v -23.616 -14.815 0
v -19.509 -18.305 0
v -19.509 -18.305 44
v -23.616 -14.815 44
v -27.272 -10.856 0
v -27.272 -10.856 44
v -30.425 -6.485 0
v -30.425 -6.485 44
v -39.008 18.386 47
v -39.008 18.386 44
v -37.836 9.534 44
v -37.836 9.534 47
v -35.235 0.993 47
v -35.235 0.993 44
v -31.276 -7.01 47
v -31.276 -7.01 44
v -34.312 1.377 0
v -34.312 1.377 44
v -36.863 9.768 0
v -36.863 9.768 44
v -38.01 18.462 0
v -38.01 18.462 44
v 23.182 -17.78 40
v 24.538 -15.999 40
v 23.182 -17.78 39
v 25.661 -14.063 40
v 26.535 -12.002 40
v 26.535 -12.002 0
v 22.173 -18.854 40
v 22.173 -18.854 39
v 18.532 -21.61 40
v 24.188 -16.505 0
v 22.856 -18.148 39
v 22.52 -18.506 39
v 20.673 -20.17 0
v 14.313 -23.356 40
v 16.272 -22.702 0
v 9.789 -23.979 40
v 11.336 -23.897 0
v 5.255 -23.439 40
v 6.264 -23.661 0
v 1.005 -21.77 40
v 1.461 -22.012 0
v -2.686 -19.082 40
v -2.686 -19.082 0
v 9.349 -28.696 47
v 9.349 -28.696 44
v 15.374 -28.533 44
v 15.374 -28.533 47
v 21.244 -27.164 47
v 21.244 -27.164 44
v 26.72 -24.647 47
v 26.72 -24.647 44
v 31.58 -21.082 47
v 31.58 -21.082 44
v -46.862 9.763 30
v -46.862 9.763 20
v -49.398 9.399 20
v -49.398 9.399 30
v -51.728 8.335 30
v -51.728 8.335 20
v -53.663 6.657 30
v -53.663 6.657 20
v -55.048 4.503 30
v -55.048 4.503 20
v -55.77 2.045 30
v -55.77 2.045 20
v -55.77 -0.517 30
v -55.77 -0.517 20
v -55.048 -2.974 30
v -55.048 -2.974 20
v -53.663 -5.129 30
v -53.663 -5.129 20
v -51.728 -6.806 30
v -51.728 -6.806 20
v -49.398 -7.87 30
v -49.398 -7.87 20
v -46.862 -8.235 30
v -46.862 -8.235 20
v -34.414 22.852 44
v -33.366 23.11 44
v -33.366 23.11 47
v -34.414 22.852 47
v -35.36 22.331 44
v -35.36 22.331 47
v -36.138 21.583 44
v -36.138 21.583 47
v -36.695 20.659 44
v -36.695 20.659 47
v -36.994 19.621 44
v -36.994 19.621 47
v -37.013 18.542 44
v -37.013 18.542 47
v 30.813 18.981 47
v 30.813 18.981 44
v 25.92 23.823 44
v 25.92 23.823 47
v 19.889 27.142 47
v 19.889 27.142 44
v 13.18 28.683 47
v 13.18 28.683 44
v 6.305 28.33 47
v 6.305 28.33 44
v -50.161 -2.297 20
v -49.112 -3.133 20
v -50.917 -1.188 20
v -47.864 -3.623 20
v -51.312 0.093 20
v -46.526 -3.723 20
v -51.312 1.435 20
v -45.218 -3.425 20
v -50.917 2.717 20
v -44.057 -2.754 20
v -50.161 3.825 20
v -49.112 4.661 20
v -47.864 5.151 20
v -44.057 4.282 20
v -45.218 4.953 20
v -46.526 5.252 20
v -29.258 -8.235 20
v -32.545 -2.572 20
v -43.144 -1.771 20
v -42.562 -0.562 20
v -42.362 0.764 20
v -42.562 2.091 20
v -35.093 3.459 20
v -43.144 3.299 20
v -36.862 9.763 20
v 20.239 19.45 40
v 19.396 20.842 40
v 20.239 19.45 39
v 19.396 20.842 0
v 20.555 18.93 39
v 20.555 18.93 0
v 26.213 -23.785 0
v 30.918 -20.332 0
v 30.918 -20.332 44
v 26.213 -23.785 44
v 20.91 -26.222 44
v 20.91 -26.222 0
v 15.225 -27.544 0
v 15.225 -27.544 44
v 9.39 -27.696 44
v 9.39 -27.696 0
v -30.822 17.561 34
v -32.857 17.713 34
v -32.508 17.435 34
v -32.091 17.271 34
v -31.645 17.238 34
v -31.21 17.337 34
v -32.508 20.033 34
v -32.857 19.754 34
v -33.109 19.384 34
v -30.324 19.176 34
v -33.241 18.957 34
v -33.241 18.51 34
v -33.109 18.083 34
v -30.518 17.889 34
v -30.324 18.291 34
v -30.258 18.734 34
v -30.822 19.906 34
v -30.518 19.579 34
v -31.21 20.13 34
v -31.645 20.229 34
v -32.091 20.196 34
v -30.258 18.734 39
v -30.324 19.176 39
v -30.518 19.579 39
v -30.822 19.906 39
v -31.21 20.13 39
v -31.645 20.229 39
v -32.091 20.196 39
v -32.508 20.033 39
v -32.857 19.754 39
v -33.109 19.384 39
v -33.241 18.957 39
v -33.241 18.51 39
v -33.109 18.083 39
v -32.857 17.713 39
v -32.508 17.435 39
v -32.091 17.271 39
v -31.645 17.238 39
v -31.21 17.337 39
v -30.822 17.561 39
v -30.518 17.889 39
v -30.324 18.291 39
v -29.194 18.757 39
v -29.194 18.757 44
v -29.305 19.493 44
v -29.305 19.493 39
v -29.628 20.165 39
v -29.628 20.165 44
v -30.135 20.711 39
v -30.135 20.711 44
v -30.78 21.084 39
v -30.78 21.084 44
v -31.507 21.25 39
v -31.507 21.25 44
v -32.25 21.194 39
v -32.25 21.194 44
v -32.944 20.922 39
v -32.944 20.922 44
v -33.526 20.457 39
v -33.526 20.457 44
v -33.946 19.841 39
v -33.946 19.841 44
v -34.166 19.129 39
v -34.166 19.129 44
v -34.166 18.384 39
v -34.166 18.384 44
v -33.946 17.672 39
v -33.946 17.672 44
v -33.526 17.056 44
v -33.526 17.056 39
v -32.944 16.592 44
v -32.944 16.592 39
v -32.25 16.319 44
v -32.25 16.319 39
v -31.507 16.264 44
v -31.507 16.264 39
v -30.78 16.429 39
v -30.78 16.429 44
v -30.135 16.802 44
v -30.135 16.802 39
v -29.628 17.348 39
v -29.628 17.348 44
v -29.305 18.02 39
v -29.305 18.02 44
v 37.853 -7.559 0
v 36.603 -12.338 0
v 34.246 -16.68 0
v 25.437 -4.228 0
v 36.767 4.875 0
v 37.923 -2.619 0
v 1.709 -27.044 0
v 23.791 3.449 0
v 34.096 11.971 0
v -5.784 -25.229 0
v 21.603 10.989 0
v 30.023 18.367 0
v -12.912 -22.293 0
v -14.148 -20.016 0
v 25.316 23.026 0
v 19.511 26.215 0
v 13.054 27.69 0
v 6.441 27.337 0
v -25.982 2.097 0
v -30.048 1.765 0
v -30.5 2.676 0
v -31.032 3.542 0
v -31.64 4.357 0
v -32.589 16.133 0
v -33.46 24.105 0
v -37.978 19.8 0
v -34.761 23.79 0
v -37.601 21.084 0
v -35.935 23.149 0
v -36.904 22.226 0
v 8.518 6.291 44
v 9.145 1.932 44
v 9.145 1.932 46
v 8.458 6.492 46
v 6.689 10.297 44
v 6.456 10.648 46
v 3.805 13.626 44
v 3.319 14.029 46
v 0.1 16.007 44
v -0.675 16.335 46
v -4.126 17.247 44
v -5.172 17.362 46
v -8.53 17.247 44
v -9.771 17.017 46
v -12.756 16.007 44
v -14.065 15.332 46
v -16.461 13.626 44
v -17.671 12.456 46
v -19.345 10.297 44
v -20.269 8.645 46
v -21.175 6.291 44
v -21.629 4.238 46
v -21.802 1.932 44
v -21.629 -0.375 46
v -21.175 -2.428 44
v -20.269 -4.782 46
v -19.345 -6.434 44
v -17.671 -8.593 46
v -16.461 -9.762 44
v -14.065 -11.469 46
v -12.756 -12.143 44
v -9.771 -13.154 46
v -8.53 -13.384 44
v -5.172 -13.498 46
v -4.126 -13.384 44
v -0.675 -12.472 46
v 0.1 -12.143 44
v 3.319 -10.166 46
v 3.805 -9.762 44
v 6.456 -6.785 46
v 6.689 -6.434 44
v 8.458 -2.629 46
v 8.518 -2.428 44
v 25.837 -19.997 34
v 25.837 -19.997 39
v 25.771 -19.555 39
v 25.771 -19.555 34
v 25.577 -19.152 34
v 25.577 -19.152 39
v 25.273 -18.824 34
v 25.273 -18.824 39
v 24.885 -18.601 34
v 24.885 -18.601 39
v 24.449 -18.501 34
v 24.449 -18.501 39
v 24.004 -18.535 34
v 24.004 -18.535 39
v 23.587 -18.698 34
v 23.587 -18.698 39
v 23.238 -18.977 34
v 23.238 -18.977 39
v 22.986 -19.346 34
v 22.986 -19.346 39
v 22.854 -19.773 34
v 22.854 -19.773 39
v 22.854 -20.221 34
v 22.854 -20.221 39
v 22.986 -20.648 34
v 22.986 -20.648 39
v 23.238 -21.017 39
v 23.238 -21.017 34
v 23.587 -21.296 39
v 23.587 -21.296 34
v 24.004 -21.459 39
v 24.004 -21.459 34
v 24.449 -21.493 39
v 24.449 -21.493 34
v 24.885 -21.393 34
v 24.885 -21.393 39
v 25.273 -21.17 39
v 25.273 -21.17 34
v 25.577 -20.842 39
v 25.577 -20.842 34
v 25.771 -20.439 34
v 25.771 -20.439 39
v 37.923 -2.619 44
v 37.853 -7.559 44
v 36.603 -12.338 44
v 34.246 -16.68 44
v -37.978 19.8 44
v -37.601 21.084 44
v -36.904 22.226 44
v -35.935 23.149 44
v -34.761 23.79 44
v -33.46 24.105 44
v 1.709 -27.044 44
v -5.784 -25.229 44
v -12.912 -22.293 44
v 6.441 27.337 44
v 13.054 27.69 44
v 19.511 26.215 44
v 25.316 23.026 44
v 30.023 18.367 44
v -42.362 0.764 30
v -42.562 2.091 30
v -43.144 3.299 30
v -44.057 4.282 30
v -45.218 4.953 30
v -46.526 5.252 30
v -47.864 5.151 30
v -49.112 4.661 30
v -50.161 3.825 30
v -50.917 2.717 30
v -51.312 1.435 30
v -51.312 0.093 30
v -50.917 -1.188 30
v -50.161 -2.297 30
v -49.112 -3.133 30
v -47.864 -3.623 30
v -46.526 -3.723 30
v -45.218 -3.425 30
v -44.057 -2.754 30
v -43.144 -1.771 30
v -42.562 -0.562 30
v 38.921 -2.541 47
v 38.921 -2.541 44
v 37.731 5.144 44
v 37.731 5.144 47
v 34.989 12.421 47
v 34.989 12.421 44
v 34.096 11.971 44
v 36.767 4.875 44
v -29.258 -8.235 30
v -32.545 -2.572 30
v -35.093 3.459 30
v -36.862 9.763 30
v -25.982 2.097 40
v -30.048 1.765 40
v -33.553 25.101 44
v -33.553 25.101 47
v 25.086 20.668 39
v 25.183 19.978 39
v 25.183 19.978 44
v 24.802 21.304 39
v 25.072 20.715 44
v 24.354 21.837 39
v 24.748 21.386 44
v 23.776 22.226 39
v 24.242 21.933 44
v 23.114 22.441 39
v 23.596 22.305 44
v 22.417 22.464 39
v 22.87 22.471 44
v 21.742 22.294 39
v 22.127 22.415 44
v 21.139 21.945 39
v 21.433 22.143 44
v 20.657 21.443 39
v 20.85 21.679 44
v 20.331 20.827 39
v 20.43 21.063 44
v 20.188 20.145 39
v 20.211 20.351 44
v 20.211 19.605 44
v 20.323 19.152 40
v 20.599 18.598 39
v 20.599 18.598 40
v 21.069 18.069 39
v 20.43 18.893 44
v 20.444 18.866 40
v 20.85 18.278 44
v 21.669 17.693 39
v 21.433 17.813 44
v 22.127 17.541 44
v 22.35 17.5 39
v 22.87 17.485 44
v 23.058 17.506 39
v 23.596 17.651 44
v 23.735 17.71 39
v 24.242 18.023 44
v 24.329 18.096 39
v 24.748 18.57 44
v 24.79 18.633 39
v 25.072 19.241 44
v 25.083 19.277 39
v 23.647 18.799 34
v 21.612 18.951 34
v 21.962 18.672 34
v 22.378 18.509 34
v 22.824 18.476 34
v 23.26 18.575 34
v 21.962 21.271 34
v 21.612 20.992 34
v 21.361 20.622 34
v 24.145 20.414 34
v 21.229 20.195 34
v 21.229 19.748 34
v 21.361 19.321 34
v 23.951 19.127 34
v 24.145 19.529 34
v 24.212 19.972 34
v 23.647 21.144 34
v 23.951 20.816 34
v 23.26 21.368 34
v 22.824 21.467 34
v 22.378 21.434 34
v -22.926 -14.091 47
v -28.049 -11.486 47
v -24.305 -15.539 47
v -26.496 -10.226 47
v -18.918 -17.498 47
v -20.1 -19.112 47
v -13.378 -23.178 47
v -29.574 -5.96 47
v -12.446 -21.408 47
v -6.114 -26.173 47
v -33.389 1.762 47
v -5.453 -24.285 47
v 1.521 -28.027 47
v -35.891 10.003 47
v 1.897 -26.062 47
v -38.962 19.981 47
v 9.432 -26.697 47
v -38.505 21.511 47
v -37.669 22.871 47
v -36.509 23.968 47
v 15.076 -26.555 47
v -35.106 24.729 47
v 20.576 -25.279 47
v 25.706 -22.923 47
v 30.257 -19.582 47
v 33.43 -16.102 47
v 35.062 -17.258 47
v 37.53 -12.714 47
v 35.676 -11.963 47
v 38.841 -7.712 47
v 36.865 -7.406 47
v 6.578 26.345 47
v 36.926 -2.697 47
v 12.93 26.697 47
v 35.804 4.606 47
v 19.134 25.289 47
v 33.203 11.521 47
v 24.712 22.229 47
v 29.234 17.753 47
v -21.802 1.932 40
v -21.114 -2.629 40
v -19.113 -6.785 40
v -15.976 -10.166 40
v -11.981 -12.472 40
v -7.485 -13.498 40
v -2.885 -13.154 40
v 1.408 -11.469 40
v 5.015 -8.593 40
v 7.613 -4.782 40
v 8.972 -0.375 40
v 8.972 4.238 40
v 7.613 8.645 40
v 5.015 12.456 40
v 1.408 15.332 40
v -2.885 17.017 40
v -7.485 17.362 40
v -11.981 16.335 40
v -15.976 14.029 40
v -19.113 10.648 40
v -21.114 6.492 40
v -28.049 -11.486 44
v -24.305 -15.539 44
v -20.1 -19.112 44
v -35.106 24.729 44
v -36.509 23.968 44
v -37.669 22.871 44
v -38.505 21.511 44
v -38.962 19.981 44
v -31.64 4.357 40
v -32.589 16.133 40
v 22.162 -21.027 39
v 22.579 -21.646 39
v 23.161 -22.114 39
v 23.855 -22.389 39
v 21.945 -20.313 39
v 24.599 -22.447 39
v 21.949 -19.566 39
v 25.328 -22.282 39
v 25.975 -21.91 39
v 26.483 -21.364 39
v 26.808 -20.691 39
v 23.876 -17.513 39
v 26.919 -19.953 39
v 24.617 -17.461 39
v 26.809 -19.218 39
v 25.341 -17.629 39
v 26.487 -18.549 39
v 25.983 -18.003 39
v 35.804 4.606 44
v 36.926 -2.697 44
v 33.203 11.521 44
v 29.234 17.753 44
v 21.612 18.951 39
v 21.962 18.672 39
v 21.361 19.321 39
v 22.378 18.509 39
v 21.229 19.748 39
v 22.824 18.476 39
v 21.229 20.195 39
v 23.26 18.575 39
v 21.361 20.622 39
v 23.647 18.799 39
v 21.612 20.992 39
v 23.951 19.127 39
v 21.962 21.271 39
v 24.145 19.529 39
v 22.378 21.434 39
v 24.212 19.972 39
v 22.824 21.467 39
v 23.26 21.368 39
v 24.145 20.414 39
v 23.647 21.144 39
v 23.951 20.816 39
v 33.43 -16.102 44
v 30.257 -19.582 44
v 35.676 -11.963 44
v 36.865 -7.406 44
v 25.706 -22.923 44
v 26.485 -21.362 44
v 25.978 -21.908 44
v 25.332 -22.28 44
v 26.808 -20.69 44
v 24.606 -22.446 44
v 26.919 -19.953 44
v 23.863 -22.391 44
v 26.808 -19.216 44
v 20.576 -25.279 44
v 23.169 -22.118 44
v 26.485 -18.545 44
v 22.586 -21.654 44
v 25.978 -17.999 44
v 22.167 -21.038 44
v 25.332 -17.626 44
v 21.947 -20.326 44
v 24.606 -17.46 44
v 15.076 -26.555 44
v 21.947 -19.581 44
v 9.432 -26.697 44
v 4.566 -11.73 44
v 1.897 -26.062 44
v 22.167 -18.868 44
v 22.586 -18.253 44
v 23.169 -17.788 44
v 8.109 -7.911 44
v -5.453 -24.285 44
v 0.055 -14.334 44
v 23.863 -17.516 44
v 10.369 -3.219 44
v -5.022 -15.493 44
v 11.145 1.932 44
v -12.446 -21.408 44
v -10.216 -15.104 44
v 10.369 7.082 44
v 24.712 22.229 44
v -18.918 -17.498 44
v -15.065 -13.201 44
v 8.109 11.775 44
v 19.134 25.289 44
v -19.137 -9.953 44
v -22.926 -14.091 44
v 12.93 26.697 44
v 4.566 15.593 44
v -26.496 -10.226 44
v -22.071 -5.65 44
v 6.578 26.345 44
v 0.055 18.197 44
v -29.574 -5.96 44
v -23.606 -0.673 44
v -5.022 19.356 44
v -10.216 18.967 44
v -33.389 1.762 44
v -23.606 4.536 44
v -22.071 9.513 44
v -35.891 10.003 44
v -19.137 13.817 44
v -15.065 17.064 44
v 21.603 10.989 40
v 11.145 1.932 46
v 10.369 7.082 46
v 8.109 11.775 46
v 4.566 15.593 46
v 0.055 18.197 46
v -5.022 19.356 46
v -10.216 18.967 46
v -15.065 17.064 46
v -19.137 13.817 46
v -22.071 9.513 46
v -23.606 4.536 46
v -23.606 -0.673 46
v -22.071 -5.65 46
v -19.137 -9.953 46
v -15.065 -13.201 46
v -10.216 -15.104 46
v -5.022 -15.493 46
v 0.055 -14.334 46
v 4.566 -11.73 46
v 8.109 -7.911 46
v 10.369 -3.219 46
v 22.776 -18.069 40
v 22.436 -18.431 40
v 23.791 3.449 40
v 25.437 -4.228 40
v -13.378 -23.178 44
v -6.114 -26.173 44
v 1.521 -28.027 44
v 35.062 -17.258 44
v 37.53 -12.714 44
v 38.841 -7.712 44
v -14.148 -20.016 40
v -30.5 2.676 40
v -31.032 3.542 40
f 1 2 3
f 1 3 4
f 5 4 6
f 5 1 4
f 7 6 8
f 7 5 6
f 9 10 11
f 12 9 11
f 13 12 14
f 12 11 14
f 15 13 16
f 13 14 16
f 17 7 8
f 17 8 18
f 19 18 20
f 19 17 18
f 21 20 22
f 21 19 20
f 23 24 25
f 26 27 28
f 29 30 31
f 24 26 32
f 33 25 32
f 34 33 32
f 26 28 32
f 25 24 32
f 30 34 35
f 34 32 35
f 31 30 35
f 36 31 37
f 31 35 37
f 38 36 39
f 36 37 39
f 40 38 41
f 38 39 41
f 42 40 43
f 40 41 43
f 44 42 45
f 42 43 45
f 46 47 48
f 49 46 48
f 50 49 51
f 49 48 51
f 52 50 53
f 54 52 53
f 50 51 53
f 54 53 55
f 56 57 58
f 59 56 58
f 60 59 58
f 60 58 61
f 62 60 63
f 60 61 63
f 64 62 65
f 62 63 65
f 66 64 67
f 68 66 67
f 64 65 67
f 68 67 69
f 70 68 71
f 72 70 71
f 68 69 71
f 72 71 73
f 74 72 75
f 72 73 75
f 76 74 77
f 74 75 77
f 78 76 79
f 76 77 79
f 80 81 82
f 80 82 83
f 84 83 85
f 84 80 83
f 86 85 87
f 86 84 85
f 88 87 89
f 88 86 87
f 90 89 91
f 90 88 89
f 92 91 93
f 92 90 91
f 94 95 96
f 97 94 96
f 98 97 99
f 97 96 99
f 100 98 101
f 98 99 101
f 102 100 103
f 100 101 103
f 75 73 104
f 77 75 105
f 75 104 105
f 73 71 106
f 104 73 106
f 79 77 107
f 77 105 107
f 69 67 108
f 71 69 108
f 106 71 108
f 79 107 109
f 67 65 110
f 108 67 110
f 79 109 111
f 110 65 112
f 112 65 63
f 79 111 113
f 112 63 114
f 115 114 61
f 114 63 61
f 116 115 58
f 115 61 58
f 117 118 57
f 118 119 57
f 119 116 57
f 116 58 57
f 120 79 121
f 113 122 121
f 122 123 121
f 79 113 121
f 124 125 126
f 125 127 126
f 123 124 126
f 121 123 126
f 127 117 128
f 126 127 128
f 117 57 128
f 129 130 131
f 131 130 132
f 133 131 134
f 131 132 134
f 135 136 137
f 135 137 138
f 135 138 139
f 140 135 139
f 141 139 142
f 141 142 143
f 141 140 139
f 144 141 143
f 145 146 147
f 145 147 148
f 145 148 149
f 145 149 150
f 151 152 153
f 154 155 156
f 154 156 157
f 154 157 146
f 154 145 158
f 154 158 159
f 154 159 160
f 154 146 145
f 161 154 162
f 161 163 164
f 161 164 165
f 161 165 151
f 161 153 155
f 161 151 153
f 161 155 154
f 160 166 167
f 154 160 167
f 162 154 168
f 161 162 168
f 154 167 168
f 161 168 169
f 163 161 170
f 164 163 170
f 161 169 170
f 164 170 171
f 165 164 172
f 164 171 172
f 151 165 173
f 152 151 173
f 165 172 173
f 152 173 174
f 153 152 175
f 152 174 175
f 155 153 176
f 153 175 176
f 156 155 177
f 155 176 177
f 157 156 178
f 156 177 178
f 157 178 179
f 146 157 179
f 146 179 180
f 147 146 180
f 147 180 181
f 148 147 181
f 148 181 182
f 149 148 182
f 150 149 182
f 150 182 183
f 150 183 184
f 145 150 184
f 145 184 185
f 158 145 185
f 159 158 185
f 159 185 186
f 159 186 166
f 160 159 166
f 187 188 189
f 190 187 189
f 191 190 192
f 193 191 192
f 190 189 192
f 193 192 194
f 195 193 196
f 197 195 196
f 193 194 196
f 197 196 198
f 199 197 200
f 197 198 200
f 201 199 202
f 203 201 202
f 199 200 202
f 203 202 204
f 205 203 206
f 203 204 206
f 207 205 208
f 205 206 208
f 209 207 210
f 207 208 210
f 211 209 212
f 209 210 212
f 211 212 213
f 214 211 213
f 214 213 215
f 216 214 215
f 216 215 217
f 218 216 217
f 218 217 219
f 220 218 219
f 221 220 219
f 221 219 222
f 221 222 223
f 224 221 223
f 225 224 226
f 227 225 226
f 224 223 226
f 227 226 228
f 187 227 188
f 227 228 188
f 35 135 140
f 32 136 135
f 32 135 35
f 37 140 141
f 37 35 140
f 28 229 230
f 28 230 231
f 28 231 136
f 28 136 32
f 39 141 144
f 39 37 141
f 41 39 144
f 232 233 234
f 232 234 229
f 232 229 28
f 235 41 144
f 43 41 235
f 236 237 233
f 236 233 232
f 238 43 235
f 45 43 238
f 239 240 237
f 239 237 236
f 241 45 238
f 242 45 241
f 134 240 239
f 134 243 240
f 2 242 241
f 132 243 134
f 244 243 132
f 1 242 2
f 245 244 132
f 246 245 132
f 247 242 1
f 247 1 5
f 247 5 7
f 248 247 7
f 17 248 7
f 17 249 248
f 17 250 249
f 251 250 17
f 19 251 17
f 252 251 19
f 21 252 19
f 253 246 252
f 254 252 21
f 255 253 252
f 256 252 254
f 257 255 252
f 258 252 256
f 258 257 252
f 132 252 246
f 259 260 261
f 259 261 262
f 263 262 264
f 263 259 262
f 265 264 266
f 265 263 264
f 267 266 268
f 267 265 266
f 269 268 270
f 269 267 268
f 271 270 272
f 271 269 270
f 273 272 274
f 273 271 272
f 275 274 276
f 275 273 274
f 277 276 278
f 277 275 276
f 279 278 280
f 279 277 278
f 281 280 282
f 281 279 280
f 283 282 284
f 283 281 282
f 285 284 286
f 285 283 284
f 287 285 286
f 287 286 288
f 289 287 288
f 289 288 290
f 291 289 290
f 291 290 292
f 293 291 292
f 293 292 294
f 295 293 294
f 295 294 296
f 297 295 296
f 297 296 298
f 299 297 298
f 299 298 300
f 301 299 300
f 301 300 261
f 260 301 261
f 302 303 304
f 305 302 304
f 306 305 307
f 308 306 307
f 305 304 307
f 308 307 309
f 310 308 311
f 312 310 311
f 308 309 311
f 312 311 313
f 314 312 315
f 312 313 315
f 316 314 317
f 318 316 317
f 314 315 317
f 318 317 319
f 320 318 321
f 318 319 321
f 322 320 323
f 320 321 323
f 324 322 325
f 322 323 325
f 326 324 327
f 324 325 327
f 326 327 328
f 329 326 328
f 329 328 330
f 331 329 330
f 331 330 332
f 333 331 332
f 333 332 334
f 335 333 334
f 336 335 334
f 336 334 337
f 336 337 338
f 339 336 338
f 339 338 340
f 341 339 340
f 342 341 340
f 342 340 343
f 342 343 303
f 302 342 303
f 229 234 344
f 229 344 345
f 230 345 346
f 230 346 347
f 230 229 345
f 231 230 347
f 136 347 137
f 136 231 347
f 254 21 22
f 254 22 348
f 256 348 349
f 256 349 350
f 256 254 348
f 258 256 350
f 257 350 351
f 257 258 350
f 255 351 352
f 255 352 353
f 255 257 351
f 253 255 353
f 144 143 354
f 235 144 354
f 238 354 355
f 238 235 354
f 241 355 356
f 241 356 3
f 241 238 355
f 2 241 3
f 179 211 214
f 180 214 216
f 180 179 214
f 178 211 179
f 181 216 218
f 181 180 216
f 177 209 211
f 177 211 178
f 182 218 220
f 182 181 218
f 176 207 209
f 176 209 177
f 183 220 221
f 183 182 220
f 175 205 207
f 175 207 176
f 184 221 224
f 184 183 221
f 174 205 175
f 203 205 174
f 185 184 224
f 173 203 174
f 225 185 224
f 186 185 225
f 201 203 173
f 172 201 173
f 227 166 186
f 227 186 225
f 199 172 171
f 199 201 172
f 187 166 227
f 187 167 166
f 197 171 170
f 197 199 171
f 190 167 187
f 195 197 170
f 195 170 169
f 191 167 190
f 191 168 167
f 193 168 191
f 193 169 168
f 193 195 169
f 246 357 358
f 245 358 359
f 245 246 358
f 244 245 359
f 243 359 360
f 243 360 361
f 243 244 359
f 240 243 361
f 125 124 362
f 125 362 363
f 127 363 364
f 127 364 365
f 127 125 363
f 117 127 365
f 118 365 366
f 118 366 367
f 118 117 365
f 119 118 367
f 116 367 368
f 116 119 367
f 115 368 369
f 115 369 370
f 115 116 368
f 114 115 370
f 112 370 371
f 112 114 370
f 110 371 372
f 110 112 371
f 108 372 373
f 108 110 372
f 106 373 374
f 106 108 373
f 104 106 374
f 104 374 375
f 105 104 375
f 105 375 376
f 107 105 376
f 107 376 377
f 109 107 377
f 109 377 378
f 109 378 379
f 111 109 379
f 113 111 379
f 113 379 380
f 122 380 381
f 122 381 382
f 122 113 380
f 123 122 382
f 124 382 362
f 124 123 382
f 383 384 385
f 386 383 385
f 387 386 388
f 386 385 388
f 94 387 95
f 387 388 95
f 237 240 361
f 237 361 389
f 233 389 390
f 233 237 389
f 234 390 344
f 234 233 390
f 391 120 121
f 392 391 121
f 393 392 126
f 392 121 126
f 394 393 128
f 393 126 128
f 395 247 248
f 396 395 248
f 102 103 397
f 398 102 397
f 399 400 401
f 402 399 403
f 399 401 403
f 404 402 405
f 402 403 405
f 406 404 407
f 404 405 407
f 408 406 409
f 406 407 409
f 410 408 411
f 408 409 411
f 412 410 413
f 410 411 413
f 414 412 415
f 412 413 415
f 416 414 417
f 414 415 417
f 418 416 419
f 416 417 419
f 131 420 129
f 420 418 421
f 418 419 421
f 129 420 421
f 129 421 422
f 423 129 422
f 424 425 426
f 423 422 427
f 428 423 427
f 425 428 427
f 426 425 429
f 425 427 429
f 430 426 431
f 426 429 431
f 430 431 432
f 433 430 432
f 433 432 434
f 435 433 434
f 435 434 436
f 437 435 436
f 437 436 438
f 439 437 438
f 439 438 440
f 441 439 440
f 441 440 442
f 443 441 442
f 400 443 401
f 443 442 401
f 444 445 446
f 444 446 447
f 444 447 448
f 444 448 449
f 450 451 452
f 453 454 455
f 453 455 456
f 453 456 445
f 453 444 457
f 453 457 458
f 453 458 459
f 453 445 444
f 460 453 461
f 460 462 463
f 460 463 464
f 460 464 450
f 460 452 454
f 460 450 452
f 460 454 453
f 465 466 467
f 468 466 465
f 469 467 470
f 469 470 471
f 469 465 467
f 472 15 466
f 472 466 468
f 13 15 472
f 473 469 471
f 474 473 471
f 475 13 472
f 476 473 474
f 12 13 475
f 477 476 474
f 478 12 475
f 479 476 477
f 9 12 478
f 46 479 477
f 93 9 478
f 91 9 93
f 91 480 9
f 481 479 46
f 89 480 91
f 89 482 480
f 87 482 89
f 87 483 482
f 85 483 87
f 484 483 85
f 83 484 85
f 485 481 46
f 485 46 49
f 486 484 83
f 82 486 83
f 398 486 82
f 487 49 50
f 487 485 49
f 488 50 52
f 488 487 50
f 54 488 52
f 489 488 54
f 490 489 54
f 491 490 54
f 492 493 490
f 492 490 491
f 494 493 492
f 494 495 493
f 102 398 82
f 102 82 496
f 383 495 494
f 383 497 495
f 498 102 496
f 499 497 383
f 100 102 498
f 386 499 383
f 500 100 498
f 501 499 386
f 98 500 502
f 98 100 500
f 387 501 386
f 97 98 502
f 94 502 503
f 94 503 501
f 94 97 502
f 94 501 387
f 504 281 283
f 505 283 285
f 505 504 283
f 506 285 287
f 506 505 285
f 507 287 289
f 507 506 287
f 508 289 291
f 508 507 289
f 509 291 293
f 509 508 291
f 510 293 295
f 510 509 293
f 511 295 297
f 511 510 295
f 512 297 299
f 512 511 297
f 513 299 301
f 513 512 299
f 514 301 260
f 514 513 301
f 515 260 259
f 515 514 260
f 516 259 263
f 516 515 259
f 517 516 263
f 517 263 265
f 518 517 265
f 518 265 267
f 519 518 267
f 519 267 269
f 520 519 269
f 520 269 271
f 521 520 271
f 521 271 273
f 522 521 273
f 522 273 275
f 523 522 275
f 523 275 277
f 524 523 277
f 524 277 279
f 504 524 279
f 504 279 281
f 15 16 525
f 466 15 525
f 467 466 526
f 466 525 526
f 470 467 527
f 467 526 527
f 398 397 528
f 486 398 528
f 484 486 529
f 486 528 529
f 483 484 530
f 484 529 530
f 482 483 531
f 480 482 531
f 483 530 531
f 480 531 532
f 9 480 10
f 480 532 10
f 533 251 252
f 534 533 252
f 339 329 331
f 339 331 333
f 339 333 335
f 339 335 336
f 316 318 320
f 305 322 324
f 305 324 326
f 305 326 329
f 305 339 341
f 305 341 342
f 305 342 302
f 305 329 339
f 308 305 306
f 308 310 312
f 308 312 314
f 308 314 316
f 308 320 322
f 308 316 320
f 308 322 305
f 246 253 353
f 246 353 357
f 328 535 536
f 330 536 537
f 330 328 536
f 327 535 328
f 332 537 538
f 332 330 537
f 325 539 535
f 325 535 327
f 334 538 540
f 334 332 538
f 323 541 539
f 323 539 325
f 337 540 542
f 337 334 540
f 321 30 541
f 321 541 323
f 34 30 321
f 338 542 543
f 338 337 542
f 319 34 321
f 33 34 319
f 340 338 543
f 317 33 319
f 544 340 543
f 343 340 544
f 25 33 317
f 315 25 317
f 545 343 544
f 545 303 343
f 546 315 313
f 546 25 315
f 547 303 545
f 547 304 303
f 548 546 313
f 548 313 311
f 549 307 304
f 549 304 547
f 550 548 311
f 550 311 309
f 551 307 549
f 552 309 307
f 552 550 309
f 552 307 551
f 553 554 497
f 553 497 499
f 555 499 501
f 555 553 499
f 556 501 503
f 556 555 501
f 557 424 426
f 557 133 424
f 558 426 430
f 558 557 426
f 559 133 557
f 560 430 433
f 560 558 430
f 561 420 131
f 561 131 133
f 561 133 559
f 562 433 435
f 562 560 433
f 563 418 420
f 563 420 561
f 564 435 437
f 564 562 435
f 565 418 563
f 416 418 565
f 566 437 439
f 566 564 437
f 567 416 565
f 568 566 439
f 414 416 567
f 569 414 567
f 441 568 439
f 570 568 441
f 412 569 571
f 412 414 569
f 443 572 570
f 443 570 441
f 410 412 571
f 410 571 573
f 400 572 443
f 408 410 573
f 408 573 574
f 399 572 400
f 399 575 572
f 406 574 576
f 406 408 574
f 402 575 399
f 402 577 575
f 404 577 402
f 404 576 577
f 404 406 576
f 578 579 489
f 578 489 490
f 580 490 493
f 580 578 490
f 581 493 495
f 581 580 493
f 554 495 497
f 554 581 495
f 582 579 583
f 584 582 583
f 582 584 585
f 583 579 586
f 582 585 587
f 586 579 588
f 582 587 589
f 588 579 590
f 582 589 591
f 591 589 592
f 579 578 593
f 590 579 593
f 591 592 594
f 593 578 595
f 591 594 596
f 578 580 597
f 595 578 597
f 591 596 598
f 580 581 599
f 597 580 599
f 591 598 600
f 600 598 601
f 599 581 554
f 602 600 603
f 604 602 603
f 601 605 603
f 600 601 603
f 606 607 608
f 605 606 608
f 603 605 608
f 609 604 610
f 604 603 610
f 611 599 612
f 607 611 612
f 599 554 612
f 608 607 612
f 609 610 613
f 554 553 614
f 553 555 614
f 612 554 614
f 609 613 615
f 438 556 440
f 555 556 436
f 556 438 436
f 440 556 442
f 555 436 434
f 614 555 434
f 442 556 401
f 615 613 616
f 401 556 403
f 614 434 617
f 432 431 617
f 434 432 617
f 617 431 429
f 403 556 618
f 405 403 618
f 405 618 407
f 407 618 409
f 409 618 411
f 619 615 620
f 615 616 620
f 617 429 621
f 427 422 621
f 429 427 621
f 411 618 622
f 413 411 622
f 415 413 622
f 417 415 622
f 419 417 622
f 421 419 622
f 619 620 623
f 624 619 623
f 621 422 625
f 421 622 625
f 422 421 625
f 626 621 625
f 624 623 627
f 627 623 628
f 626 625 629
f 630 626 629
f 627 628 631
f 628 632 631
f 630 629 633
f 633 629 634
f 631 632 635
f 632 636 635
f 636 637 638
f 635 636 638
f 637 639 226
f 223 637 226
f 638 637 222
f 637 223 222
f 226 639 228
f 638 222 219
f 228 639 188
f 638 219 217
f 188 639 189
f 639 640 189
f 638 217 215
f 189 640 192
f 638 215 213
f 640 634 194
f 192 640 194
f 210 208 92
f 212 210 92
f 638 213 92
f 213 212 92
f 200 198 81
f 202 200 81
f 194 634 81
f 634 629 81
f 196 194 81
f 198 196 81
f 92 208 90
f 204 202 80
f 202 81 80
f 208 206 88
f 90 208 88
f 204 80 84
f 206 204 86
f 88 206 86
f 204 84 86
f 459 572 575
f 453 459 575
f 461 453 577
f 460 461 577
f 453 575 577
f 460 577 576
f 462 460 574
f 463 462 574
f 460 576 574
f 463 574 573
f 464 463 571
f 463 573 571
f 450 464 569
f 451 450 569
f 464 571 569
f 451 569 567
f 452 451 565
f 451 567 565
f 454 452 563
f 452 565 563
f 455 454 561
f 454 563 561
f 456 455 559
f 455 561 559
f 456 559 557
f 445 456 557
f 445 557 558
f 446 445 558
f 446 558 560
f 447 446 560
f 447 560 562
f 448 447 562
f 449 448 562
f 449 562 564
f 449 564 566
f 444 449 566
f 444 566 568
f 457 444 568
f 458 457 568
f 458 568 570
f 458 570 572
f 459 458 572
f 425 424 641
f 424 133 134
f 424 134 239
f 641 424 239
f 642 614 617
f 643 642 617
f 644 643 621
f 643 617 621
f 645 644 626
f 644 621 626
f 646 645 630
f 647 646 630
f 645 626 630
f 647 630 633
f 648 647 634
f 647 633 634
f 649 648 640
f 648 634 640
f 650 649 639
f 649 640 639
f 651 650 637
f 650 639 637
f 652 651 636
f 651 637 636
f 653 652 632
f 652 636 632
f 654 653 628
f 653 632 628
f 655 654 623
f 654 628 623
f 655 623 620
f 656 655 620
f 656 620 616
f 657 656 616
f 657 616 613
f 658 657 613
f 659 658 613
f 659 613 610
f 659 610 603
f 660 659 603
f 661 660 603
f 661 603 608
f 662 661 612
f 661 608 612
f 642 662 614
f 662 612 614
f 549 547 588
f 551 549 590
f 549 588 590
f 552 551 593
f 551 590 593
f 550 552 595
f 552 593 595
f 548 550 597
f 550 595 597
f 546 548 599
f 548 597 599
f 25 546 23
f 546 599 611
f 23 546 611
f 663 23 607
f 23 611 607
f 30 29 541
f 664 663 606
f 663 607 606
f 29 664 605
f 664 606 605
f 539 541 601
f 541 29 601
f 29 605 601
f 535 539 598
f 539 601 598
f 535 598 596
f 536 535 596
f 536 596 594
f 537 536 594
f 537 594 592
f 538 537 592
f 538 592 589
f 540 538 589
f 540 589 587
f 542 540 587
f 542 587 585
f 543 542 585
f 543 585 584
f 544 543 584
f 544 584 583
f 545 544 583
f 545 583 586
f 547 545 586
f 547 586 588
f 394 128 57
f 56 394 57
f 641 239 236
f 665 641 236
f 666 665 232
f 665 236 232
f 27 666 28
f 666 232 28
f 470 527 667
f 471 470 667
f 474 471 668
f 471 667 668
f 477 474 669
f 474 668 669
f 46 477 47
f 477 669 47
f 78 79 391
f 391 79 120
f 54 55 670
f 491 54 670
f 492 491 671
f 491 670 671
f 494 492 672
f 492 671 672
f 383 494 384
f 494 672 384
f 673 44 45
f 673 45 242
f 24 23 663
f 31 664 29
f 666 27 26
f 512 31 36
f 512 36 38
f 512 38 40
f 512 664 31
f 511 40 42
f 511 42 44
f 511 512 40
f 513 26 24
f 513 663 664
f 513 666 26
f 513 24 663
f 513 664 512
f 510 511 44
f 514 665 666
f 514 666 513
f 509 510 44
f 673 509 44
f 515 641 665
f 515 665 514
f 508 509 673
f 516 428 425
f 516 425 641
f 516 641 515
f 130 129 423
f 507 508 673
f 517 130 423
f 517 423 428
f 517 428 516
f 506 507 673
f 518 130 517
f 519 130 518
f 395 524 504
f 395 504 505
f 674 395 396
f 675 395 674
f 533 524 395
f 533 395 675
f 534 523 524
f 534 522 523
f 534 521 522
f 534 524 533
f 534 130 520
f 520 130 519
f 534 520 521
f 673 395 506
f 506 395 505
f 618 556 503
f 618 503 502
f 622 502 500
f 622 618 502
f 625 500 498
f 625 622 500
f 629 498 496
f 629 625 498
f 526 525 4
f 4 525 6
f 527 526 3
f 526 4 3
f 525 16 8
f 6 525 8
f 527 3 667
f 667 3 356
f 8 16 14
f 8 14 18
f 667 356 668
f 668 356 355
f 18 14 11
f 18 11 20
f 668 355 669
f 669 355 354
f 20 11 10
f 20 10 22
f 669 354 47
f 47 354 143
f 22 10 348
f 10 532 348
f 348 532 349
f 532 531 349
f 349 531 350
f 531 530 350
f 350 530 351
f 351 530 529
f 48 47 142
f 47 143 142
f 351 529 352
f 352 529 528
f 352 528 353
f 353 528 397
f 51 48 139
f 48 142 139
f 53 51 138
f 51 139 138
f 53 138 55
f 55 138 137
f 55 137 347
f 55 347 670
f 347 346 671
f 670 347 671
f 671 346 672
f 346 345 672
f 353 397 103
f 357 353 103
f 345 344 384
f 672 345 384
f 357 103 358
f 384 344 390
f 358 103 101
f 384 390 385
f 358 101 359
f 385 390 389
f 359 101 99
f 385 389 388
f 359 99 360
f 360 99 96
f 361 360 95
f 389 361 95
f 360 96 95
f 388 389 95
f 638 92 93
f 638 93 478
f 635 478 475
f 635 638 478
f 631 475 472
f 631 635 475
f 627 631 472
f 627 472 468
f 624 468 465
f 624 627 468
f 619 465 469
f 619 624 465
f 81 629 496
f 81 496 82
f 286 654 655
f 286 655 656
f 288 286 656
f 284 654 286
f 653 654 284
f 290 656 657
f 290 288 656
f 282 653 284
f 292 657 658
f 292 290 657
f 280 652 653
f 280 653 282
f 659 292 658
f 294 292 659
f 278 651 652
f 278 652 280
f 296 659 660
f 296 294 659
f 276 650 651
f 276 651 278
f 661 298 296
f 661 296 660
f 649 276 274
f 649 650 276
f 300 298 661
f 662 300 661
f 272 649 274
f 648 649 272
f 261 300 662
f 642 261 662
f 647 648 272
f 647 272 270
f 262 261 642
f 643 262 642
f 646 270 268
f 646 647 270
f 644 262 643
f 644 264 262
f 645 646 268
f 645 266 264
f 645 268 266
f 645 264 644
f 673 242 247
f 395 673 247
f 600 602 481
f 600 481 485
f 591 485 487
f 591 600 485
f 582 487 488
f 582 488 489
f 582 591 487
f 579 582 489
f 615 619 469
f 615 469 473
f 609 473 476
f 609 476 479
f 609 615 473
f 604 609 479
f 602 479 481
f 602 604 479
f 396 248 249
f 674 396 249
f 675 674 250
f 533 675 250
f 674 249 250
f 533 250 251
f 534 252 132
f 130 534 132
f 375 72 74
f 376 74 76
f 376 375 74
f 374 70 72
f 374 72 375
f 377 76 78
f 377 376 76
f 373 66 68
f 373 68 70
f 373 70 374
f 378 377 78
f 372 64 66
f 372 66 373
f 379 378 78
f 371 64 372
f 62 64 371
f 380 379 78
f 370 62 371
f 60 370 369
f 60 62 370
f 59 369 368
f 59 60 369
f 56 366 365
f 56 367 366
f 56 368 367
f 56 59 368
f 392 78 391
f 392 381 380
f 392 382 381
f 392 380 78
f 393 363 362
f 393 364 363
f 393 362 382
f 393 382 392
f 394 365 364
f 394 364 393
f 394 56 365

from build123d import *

# Parameters (mm, degrees)
SKETCH1_R           = 15.473305228
BOSS_EXTRUDE1_DEPTH = 44
CUT_EXTRUDE1_DEPTH  = 40
SKETCH11_R          = 2.5
CUT_EXTRUDE5_DEPTH  = 5
SKETCH13_R          = 1.5
CUT_EXTRUDE6_DEPTH  = 10
EXTRUDE_THIN1_DEPTH = 3
SKETCH15_R          = 17.473305228
SKETCH15_R_2        = 15.473305228
EXTRUDE_THIN2_DEPTH = 2
SKETCH16_R          = 4.5
BOSS_EXTRUDE3_DEPTH = 10


with BuildPart() as part:
    # Sketch1 → Boss-Extrude1 (new body)
    with BuildSketch(Plane.XY):
        with BuildLine():
            Line((-33.460012183, 24.105358493), (6.44060775, 27.337295096))
            ThreePointArc((6.44060775, 27.337295096), (19.511223581, 26.215252174), (30.02344729, 18.367123019))
            ThreePointArc((30.02344729, 18.367123019), (35.615507496, 8.492393106), (37.923471704, -2.618625272))
            ThreePointArc((37.923471704, -2.618625272), (36.602926602, -12.338143221), (30.918344751, -20.331790555))
            ThreePointArc((30.918344751, -20.331790555), (20.90952312, -26.221839229), (9.390207544, -27.696475614))
            ThreePointArc((9.390207544, -27.696475614), (-5.783622527, -25.229282546), (-19.509023413, -18.30501138))
            ThreePointArc((-19.509023413, -18.30501138), (-25.50374799, -12.890541162), (-30.425344214, -6.484988797))
            ThreePointArc((-30.425344214, -6.484988797), (-35.759622679, 5.519916373), (-38.010488257, 18.462322604))
            ThreePointArc((-38.010488257, 18.462322604), (-36.903961219, 22.226275001), (-33.460012183, 24.105358493))
        make_face()
        with Locations(Location((-6.328229734, 1.931646276, 0), (0, 0, 180))):
            Circle(SKETCH1_R, mode=Mode.SUBTRACT)
    extrude(amount=BOSS_EXTRUDE1_DEPTH)

    # Sketch2 → Cut-Extrude1 (cut)
    with BuildSketch(Plane(origin=(0, 0, 0), x_dir=(-1, 0, 0), z_dir=(0, 0, -1))):
        with BuildLine():
            Line((32.589203678, 16.132996937), (-19.395696883, 20.841993812))
            Line((-19.395696883, 20.841993812), (-20.554693465, 18.929777625))
            Line((-20.554693465, 18.929777625), (-21.602789168, 10.988646033))
            ThreePointArc((-21.602789168, 10.988646033), (-24.682296454, -0.374799149), (-26.534540168, -12.001511701))
            ThreePointArc((-26.534540168, -12.001511701), (-13.846491261, -23.475208696), (2.686334367, -19.082261559))
            Line((2.686334367, -19.082261559), (14.1483705, -20.015779015))
            Line((14.1483705, -20.015779015), (25.98241591, 2.09655619))
            Line((25.98241591, 2.09655619), (30.047601379, 1.765470024))
            ThreePointArc((30.047601379, 1.765470024), (30.755878379, 3.115232347), (31.639547807, 4.357264141))
            Line((31.639547807, 4.357264141), (32.589203678, 16.132996937))
        make_face()
    extrude(amount=-CUT_EXTRUDE1_DEPTH, mode=Mode.SUBTRACT)

    # Sketch11 → Cut-Extrude5 (cut)
    with BuildSketch(Plane.XY.offset(44)):
        with Locations((22.682806968, 19.978071842)):
            Circle(SKETCH11_R)
        with Locations((-31.693806202, 18.756611951)):
            Circle(SKETCH11_R)
        with Locations((24.419060413, -19.953201173)):
            Circle(SKETCH11_R)
    extrude(amount=-CUT_EXTRUDE5_DEPTH, mode=Mode.SUBTRACT)

    # Sketch13 → Cut-Extrude6 (cut)
    with BuildSketch(Plane.XY.offset(44)):
        with Locations((-31.757557343, 18.733539273)):
            Circle(SKETCH13_R)
        with Locations((22.712029929, 19.97151531)):
            Circle(SKETCH13_R)
        with Locations((24.337392738, -19.997060426)):
            Circle(SKETCH13_R)
    extrude(amount=-CUT_EXTRUDE6_DEPTH, mode=Mode.SUBTRACT)

    # Sketch14 → Extrude-Thin1 (add)
    with BuildSketch(Plane.XY.offset(44)):
        with BuildLine():
            ThreePointArc((-39.007910632, 18.385521852), (-36.710647786, 5.210188188), (-31.276438105, -7.010130911))
            ThreePointArc((-31.276438105, -7.010130911), (-26.238328339, -13.569062876), (-20.099937032, -19.111832102))
            ThreePointArc((-20.099937032, -19.111832102), (-6.114170153, -26.173336976), (9.348749737, -28.696159753))
            ThreePointArc((9.348749737, -28.696159753), (21.243614885, -27.164441879), (31.579782842, -21.081875933))
            ThreePointArc((31.579782842, -21.081875933), (37.52971495, -12.713819205), (38.920828499, -2.540773025))
            ThreePointArc((38.920828499, -2.540773025), (36.548052351, 8.853568184), (30.812789557, 18.981146321))
            ThreePointArc((30.812789557, 18.981146321), (19.88863716, 27.141581431), (6.304879392, 28.329576255))
            Line((6.304879392, 28.329576255), (-33.553105346, 25.101093087))
            ThreePointArc((-33.553105346, 25.101093087), (-37.668719443, 22.870899287), (-39.007910632, 18.385521852))
        make_face()
        with BuildLine():
            ThreePointArc((-37.013176969, 18.541697373), (-34.808968071, 5.830889726), (-29.574259358, -5.959826648))
            ThreePointArc((-29.574259358, -5.959826648), (-24.769169875, -12.212017029), (-18.918095758, -17.498197235))
            ThreePointArc((-18.918095758, -17.498197235), (-5.452946572, -24.28525911), (9.431913531, -26.696771337))
            ThreePointArc((9.431913531, -26.696771337), (20.575585264, -25.27917956), (30.256964564, -19.581646671))
            ThreePointArc((30.256964564, -19.581646671), (35.676093796, -11.962570151), (36.926108056, -2.696786157))
            ThreePointArc((36.926108056, -2.696786157), (34.683002453, 8.131105233), (29.234060411, 17.753152069))
            ThreePointArc((29.234060411, 17.753152069), (19.134313202, 25.288707505), (6.577502037, 26.345108378))
            Line((6.577502037, 26.345108378), (-33.365641877, 23.109727346))
            ThreePointArc((-33.365641877, 23.109727346), (-36.137926894, 21.58309591), (-37.013176969, 18.541697373))
        make_face(mode=Mode.SUBTRACT)
    extrude(amount=EXTRUDE_THIN1_DEPTH)

    # Sketch15 → Extrude-Thin2 (add)
    with BuildSketch(Plane.XY.offset(44)):
        with Locations((-6.328229734, 1.931646276)):
            Circle(SKETCH15_R)
        with Locations((-6.328229734, 1.931646276)):
            Circle(SKETCH15_R_2, mode=Mode.SUBTRACT)
    extrude(amount=EXTRUDE_THIN2_DEPTH)


with BuildPart() as body_2:
    # Sketch16 → Boss-Extrude3 (new body)
    with BuildSketch(Plane.XY.offset(20)):
        with BuildLine():
            Line((-36.862226699, 9.763374101), (-46.862226699, 9.763374101))
            ThreePointArc((-46.862226699, 9.763374101), (-55.861417589, 0.764183211), (-46.862226699, -8.235007679))
            Line((-46.862226699, -8.235007679), (-29.258325932, -8.235007679))
            ThreePointArc((-29.258325932, -8.235007679), (-33.913658423, 0.403648973), (-36.862226699, 9.763374101))
        make_face()
        with Locations((-46.862226699, 0.764183211)):
            Circle(SKETCH16_R, mode=Mode.SUBTRACT)
    extrude(amount=BOSS_EXTRUDE3_DEPTH)


solid = Compound([part.part, body_2.part])
